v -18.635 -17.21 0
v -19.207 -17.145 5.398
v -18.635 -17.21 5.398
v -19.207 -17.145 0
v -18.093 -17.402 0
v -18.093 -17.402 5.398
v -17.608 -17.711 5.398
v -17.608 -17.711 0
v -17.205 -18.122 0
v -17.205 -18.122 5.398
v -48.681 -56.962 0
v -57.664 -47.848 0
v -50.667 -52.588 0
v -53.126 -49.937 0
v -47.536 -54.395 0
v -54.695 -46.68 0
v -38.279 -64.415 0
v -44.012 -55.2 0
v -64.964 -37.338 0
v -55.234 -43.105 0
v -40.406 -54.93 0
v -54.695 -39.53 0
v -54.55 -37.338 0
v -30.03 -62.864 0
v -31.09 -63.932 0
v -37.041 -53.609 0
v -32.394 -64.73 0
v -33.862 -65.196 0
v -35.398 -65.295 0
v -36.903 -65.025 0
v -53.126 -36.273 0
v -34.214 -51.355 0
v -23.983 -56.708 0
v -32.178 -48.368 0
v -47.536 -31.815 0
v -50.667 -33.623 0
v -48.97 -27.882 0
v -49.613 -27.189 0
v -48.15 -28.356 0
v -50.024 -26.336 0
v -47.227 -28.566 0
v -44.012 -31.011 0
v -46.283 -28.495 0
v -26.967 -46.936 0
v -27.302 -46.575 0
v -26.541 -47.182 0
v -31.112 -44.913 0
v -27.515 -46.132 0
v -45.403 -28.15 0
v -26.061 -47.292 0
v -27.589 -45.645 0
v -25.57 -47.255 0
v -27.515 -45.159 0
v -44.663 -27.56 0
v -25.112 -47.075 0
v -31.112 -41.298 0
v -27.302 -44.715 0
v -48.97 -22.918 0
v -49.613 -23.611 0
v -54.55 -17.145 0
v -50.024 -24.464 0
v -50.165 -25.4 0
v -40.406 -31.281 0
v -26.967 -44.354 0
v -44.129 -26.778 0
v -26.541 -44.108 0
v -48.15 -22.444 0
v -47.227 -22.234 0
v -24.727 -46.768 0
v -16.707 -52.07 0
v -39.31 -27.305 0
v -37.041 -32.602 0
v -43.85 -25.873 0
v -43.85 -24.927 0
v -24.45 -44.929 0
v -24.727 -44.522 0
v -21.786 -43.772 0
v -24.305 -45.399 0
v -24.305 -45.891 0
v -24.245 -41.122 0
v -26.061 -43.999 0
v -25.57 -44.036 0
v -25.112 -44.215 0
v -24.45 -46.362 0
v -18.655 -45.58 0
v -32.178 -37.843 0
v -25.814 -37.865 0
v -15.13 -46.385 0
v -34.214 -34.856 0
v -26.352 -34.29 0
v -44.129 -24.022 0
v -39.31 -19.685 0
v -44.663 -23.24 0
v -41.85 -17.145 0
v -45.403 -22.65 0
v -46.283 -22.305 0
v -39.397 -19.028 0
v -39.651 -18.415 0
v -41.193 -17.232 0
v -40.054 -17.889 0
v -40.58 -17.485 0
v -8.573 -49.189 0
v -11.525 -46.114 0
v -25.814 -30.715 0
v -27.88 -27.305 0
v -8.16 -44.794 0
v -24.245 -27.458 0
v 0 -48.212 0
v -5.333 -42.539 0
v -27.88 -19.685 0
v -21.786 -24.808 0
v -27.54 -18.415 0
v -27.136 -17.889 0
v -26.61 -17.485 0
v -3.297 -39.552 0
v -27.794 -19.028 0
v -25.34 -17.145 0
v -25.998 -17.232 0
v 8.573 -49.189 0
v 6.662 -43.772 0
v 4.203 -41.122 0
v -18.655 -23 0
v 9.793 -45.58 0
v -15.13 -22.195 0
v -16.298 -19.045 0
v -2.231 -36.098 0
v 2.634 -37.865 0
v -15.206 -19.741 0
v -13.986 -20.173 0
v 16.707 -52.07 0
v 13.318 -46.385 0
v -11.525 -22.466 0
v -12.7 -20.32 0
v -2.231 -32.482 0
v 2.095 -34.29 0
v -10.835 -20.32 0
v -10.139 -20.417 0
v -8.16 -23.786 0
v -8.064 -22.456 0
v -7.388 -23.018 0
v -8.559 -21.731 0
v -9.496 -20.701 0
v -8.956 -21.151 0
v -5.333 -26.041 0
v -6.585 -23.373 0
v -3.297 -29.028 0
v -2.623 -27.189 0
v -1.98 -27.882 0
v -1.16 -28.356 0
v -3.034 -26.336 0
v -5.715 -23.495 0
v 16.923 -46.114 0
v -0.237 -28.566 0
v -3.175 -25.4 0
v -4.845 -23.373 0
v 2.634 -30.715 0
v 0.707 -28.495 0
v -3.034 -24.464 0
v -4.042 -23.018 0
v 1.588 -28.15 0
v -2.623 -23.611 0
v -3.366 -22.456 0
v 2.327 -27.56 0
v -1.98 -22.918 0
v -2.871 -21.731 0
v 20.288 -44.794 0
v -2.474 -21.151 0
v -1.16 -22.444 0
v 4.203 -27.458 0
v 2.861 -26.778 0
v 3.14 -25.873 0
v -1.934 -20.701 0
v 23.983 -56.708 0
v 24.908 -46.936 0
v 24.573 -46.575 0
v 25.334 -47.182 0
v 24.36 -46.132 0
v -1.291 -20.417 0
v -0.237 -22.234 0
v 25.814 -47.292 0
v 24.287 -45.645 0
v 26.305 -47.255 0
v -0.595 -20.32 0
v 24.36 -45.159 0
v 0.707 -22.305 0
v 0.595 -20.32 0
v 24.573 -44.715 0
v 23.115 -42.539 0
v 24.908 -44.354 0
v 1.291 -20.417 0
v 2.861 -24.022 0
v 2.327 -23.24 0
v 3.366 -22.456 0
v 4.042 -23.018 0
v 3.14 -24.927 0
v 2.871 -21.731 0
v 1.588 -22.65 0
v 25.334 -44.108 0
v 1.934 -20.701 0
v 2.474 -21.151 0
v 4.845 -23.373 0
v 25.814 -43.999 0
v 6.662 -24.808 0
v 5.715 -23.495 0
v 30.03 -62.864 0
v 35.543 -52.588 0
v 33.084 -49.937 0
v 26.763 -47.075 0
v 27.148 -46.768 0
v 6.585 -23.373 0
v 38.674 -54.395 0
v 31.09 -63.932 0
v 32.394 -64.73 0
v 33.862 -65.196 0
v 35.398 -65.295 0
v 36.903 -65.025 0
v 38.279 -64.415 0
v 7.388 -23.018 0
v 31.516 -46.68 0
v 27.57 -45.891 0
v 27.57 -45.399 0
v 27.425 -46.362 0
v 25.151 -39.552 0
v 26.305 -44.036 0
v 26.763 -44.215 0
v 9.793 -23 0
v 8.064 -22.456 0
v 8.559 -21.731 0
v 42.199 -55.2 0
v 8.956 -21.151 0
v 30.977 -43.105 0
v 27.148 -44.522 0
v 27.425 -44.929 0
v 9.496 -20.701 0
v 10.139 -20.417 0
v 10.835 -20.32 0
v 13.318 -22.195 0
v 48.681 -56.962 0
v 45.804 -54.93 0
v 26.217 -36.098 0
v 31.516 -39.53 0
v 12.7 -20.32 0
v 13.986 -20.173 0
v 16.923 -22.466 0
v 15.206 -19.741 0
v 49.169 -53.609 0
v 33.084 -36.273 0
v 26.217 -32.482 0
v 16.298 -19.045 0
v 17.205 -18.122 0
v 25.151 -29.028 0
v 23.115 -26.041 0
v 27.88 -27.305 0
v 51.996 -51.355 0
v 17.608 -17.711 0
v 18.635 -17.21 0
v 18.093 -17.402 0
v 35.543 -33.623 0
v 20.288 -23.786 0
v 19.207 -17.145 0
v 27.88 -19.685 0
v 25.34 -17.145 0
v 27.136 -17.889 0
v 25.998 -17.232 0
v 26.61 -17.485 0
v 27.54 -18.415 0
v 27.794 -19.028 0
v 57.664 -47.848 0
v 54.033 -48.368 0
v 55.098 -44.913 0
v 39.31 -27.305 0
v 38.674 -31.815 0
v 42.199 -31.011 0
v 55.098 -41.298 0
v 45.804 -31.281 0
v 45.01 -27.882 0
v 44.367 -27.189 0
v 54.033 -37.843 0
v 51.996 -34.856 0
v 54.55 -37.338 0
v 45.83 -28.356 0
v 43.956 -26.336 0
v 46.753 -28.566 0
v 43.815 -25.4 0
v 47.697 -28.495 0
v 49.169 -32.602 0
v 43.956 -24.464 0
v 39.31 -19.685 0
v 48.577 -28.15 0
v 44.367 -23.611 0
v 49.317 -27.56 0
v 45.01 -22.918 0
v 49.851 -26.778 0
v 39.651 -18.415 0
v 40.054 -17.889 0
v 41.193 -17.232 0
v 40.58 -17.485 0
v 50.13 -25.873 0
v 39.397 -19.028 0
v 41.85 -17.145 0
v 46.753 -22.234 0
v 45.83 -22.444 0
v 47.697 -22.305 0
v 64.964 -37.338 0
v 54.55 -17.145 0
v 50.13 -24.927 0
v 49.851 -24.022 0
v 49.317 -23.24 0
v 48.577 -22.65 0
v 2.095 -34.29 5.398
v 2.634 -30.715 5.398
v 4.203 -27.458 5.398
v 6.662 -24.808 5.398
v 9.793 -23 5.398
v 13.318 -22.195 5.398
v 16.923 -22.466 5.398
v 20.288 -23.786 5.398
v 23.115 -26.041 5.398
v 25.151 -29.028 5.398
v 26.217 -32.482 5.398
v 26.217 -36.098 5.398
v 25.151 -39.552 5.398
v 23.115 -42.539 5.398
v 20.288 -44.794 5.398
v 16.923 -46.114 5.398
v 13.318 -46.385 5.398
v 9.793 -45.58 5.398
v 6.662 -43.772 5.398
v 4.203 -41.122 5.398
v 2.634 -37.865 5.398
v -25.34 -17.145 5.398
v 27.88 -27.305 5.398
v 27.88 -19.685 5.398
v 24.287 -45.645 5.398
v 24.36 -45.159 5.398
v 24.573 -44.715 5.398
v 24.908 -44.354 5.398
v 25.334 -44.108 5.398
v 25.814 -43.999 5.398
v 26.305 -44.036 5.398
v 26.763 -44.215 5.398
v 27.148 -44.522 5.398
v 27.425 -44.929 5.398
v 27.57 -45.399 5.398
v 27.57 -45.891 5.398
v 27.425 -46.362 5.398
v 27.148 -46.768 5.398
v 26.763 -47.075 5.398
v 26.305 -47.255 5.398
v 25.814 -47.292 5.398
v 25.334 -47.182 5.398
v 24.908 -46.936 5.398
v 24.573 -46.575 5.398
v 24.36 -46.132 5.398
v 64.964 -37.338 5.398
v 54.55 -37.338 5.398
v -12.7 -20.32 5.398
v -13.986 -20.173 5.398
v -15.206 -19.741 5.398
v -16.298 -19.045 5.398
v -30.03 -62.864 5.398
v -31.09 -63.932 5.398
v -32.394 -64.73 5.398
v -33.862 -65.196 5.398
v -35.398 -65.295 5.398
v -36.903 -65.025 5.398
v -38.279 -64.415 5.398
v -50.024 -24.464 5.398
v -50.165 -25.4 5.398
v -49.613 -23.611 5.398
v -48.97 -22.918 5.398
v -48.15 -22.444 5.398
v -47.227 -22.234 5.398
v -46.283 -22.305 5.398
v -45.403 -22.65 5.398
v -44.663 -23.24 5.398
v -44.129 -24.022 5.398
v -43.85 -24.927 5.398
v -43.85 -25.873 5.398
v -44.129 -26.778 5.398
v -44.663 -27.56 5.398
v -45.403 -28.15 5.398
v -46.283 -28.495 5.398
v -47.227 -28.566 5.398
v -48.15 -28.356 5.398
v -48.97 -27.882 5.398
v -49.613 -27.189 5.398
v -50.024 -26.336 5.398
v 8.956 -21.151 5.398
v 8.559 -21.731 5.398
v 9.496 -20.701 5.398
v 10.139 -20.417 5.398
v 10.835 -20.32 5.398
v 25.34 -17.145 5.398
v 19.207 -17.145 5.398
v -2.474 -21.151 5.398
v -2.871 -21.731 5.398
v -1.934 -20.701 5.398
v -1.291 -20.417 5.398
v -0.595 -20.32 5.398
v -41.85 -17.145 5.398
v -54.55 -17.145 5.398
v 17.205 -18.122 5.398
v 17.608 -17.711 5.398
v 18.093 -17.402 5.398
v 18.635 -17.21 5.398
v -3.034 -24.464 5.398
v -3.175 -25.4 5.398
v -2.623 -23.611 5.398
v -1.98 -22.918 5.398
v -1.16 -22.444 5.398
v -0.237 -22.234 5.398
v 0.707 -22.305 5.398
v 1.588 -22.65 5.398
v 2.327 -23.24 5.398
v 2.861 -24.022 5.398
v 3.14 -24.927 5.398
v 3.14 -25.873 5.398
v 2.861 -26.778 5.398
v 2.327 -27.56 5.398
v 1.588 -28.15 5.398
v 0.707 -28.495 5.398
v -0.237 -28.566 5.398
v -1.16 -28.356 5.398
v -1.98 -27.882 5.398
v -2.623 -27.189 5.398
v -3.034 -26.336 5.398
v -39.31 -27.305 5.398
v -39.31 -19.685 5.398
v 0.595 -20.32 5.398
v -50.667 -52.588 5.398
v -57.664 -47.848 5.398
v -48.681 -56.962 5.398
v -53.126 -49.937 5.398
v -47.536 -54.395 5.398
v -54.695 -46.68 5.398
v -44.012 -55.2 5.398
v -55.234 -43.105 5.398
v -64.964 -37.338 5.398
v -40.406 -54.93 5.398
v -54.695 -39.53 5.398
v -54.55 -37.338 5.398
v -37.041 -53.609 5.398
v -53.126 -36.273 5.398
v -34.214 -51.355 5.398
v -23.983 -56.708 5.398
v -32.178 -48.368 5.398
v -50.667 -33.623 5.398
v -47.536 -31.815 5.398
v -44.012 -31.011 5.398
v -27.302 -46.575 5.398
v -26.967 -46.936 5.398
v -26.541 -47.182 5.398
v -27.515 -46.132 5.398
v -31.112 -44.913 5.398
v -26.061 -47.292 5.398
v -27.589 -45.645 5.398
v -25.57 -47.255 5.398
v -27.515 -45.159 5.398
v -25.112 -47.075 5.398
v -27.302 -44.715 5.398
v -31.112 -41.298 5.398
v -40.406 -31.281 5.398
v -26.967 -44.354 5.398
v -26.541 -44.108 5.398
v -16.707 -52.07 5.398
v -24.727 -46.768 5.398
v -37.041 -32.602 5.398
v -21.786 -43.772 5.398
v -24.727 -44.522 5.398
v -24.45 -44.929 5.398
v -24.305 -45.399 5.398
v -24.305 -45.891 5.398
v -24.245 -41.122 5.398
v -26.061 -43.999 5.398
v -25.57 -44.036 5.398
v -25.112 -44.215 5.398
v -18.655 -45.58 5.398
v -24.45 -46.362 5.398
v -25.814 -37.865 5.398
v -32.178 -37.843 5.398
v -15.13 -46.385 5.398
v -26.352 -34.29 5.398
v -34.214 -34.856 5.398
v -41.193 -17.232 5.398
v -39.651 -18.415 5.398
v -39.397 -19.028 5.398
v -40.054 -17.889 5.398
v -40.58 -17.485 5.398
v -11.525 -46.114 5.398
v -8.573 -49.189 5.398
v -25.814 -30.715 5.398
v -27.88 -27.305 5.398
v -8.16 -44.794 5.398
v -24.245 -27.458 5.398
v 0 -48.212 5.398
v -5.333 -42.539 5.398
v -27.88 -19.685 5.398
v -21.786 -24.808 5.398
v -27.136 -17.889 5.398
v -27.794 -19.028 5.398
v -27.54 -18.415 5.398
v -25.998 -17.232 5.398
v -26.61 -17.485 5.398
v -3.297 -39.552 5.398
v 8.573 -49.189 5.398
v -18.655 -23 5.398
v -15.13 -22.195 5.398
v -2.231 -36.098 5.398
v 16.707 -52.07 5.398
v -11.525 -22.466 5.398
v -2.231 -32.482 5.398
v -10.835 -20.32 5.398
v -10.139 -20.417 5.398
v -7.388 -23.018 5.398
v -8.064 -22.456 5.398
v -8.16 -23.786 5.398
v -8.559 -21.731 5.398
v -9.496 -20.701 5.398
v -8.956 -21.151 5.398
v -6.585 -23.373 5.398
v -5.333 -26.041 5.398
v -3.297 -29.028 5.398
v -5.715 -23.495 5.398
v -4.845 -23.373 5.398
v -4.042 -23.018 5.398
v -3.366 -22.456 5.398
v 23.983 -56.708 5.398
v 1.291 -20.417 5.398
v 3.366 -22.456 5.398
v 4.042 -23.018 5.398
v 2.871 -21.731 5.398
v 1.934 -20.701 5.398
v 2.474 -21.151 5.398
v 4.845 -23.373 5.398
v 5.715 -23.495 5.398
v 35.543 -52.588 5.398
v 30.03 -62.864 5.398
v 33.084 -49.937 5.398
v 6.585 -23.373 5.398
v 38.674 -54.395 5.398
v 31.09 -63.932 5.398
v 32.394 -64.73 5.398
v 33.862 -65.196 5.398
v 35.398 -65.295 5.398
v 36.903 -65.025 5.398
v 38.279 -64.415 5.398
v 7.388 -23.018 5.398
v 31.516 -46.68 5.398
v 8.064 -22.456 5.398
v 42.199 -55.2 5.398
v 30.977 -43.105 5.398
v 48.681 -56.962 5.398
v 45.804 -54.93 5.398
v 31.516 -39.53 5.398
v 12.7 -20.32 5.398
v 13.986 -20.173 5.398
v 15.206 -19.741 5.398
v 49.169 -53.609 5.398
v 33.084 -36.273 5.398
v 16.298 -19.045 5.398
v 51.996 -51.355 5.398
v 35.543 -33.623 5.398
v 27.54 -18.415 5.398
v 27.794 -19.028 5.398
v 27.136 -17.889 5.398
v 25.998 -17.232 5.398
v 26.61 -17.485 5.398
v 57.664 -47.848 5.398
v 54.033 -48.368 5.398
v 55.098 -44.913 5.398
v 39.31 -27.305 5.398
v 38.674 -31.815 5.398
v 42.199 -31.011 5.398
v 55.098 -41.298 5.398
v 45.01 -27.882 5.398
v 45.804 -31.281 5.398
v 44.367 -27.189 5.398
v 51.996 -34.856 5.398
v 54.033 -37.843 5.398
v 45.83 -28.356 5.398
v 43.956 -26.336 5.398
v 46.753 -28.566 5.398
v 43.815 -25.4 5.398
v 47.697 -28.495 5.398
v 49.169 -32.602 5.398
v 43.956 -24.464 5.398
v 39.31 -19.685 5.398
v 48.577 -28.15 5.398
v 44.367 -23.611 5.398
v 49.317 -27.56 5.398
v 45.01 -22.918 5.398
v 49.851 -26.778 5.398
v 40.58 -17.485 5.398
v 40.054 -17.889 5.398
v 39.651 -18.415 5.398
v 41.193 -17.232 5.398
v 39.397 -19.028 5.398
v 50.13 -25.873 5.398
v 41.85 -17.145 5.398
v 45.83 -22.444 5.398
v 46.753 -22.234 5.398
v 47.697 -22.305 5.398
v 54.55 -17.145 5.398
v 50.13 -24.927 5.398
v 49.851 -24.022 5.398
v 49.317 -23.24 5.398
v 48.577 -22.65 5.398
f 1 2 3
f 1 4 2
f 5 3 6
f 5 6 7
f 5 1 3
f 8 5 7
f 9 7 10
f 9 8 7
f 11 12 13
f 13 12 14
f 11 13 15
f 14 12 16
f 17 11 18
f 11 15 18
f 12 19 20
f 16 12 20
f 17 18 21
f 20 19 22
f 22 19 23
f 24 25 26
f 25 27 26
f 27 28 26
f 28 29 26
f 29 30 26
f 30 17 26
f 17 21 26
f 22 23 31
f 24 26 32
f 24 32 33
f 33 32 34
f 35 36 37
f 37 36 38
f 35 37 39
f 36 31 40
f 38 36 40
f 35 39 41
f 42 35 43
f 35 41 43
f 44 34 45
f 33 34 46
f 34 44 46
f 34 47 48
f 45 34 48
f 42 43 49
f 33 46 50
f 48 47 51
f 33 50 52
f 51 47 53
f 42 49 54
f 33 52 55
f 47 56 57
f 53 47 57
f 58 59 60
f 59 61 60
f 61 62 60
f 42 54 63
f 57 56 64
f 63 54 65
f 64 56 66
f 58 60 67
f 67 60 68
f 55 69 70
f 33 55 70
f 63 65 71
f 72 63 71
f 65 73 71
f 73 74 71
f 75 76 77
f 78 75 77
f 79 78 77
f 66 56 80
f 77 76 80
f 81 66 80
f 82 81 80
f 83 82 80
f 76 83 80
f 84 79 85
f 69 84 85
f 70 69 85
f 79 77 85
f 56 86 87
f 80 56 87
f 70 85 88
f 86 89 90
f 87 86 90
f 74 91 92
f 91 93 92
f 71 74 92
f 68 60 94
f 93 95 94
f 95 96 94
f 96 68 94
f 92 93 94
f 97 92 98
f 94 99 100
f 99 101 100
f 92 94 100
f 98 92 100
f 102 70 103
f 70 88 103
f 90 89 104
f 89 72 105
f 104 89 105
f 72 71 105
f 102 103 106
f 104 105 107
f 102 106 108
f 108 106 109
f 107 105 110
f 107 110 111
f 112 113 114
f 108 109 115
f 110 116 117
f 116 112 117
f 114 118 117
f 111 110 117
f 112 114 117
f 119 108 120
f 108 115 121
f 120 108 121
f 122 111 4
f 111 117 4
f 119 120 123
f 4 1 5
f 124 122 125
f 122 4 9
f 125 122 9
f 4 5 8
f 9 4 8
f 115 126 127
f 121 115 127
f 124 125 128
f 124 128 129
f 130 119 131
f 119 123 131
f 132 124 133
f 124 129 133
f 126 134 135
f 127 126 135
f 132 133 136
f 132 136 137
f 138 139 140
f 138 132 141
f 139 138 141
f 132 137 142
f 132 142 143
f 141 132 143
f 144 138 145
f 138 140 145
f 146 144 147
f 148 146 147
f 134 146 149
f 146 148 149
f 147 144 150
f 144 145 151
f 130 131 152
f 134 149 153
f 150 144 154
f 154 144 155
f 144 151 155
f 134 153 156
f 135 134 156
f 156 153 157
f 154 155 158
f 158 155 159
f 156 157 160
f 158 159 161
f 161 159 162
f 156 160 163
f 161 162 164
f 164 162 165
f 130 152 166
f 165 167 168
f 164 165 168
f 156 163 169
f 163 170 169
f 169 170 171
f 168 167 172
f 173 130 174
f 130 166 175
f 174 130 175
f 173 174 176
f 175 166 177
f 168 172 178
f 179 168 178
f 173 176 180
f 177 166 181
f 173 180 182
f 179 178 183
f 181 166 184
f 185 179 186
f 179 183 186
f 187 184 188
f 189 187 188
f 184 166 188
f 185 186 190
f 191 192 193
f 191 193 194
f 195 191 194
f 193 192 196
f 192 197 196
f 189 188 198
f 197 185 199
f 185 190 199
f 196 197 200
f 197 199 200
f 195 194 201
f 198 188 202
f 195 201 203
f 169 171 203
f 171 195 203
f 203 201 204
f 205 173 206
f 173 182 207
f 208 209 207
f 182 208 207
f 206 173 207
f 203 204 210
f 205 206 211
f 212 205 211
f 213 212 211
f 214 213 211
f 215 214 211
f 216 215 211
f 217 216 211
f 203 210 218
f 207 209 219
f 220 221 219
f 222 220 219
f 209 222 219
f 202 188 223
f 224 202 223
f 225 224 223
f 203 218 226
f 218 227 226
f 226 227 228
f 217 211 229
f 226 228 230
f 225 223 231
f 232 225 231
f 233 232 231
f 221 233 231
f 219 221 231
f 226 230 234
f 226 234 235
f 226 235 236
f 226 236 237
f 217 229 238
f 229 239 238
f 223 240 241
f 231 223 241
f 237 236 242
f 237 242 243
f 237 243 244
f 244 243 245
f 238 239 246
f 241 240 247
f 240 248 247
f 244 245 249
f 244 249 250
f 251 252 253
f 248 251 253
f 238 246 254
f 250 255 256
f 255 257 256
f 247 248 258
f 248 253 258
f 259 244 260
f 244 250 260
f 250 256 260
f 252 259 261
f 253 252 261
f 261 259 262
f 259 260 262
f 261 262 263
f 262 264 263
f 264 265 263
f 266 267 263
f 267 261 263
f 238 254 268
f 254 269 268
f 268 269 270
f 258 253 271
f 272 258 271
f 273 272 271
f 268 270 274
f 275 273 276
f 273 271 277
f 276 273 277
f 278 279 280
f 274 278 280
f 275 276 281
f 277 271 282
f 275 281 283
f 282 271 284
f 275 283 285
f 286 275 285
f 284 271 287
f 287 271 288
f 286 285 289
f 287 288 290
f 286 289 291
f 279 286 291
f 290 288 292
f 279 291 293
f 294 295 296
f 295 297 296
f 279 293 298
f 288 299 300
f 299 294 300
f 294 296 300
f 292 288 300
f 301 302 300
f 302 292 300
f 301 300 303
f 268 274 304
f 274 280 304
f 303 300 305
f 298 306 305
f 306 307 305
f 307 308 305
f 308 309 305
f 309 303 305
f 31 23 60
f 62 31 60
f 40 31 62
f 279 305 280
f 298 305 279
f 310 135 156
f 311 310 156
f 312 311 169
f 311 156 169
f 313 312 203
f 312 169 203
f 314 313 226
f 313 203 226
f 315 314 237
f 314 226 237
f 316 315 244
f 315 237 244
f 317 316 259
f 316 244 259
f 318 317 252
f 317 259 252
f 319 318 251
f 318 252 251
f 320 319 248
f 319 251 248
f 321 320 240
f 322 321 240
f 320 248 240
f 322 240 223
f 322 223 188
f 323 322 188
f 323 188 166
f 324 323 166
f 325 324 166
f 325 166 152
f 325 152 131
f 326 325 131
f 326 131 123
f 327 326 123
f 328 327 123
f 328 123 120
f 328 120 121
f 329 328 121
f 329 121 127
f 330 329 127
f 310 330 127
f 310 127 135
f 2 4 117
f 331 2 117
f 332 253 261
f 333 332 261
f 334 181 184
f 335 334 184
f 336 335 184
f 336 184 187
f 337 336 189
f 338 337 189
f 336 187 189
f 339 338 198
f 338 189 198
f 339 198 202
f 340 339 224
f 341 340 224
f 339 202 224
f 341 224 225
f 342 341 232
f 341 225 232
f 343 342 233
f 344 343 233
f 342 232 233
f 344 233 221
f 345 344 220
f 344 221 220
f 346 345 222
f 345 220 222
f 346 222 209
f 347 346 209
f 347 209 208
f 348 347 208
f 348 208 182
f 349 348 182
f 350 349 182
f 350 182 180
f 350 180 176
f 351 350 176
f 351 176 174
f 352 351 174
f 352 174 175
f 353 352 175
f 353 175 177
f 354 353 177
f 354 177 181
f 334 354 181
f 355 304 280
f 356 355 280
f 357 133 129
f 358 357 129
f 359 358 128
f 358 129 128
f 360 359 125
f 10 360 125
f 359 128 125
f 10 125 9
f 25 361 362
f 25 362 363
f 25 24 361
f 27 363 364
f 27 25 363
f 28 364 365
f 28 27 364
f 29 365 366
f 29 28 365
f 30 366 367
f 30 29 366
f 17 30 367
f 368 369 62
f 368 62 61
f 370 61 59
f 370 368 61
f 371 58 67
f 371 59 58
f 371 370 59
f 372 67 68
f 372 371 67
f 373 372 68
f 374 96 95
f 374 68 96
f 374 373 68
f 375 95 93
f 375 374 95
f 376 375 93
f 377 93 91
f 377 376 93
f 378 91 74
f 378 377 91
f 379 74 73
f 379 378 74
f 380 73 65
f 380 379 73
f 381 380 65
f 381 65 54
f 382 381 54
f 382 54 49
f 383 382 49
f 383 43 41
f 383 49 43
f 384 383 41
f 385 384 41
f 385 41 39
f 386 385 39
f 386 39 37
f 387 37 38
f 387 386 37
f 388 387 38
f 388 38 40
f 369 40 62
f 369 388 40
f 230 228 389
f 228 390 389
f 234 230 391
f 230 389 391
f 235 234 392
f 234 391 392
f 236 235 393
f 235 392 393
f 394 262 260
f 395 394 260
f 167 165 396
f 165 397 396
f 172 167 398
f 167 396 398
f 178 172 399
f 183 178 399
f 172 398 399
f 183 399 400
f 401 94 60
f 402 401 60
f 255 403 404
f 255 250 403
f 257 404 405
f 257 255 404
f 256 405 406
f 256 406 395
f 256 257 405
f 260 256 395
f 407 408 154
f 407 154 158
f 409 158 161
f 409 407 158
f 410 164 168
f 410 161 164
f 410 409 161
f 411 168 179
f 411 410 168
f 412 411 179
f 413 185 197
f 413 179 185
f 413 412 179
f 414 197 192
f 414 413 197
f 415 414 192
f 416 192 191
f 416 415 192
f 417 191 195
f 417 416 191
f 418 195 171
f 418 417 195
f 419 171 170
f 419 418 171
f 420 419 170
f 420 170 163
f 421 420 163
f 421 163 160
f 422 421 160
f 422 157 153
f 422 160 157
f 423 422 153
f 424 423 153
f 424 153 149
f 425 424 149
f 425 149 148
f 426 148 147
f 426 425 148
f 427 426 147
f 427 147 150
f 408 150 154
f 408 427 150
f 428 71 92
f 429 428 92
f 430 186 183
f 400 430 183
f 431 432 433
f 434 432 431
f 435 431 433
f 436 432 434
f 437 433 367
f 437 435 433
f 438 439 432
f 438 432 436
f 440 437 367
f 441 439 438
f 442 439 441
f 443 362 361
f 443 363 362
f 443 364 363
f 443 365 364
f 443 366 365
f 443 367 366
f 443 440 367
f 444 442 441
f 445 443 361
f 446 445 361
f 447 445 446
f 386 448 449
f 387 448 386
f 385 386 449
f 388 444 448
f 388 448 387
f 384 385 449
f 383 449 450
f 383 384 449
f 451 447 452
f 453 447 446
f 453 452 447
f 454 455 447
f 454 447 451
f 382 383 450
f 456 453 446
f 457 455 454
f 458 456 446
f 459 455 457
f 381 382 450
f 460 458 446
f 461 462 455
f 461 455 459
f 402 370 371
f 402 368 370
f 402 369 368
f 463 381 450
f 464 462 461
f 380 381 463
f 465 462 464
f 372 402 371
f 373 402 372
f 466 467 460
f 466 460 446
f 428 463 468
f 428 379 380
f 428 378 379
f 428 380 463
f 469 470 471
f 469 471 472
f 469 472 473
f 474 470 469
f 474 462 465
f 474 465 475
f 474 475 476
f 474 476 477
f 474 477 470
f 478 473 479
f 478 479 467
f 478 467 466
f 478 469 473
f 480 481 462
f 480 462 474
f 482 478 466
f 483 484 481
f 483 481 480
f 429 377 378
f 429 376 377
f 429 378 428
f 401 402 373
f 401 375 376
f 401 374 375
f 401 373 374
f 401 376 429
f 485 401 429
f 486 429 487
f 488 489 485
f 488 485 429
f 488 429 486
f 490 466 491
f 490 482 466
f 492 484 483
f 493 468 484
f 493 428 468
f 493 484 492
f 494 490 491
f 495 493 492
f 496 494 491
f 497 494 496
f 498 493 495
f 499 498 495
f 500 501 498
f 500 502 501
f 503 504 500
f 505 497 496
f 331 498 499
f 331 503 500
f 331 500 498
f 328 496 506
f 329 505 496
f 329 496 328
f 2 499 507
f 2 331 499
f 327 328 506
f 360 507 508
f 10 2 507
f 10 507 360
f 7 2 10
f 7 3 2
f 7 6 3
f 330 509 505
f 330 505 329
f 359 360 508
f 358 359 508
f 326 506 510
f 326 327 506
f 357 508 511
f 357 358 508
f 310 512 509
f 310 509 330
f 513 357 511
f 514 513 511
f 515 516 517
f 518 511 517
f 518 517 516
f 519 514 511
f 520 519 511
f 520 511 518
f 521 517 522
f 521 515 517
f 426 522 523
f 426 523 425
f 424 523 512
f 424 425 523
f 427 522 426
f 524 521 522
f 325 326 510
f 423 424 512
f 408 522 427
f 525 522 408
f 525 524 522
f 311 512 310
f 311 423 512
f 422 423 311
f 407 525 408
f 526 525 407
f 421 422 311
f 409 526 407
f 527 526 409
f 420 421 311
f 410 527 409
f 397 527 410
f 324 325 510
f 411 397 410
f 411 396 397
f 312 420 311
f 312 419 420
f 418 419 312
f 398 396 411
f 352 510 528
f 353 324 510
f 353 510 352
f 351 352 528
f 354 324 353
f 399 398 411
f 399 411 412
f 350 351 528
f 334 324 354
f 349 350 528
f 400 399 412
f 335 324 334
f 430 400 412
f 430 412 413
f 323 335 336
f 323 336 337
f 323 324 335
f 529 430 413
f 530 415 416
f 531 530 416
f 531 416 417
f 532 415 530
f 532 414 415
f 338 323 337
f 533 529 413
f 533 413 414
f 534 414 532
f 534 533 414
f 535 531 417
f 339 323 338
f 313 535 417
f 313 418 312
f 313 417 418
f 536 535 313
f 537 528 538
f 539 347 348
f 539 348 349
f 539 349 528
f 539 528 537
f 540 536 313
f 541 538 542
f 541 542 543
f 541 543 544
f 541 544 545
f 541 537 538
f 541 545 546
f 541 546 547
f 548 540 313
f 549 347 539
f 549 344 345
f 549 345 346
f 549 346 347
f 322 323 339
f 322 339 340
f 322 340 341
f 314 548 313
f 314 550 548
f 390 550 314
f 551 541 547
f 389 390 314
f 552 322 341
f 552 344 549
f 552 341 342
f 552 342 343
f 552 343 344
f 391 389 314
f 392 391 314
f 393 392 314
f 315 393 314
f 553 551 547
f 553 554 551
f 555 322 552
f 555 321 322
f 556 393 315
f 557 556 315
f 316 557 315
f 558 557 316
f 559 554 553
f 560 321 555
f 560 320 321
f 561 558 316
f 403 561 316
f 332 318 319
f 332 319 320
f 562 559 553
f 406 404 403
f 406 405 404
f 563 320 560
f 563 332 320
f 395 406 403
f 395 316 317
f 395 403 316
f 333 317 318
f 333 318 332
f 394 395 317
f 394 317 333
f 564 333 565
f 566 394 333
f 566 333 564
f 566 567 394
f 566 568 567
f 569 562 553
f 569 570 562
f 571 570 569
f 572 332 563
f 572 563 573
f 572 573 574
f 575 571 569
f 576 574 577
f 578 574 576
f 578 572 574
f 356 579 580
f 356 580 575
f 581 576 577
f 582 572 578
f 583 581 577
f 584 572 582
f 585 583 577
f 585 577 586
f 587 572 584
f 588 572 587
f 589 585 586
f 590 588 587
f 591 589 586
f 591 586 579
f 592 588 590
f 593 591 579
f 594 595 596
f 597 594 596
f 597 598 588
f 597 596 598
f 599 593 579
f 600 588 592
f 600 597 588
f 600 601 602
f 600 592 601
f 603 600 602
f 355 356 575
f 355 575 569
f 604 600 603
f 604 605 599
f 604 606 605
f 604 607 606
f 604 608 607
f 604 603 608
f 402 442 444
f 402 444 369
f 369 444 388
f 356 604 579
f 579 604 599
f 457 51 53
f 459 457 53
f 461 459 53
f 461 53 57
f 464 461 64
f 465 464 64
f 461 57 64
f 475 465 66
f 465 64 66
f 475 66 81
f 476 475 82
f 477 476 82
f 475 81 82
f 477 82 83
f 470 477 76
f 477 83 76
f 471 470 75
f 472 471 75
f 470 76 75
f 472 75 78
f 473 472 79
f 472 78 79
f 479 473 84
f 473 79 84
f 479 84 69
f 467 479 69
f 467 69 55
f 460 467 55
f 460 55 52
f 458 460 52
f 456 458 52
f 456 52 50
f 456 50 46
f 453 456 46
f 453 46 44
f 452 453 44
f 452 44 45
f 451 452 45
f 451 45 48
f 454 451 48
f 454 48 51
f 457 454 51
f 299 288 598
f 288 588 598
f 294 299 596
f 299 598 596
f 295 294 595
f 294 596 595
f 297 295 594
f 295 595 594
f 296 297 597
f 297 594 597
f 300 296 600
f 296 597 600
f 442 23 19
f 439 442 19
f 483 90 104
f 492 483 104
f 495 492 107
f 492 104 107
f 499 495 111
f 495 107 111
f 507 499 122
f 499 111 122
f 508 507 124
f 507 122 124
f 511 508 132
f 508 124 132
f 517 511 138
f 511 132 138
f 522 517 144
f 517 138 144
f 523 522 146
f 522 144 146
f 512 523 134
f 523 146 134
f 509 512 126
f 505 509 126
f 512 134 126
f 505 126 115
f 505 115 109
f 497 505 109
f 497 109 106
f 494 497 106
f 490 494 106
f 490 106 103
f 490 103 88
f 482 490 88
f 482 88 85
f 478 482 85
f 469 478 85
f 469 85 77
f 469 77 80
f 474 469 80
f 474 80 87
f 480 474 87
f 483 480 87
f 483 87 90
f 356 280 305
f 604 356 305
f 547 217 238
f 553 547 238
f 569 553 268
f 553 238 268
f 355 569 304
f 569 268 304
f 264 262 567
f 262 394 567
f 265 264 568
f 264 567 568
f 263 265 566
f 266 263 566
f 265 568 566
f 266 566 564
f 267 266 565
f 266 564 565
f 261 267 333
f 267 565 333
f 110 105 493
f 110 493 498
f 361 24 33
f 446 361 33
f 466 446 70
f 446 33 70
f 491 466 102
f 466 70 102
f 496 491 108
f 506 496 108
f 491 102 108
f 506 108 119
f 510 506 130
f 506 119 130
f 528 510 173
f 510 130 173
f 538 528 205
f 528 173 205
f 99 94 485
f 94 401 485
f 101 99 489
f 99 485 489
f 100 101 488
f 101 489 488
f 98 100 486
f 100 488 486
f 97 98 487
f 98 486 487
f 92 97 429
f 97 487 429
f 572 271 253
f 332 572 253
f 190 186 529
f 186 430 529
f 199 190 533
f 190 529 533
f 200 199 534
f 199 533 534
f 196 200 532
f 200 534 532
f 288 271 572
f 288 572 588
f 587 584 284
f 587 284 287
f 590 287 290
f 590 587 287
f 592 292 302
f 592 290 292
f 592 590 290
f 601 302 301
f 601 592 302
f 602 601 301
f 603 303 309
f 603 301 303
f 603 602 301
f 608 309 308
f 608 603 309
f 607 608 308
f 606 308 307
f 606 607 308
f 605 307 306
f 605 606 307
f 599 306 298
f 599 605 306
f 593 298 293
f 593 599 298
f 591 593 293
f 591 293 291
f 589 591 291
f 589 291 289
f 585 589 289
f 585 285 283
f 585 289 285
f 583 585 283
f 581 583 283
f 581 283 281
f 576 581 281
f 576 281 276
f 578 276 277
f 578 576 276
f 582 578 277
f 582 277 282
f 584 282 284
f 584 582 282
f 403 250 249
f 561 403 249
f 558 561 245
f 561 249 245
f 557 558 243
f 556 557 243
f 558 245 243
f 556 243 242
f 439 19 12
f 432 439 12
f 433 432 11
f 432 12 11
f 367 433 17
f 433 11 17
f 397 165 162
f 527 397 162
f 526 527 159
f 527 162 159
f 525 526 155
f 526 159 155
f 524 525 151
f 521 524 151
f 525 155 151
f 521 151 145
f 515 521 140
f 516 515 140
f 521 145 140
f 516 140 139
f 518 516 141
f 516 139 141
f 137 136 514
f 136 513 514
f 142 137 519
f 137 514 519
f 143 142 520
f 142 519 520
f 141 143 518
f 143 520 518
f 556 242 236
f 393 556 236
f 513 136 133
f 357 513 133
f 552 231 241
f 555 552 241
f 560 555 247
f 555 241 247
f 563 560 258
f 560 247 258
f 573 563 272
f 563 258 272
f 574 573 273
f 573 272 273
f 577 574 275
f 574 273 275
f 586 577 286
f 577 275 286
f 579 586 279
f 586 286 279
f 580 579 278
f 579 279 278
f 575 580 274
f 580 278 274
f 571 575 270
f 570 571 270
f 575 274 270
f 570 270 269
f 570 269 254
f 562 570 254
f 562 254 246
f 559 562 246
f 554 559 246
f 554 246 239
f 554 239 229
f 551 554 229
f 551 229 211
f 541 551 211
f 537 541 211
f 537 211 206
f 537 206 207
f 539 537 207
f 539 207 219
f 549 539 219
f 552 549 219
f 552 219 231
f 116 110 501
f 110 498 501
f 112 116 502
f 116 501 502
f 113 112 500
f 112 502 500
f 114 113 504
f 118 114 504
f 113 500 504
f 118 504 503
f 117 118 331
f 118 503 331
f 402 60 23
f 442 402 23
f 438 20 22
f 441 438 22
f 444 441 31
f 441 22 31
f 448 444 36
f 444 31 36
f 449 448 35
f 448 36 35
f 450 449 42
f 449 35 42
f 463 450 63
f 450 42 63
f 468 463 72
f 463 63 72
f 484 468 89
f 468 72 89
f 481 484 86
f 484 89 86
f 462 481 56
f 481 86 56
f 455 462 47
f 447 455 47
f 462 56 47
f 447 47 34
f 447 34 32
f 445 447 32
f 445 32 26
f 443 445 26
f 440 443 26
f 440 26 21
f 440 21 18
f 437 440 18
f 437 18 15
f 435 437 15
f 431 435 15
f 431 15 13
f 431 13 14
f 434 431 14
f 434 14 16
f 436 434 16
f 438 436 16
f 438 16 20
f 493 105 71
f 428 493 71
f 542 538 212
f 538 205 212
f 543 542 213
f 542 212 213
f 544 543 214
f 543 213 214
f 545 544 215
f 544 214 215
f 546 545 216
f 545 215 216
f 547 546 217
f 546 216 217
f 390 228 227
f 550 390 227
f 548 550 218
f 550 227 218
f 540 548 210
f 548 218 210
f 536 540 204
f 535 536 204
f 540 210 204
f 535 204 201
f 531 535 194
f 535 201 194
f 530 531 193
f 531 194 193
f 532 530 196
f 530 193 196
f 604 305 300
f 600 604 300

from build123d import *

# Parameters (mm, degrees)
SKETCH1_R                 = 1.651
BOSS_EXTRUDE2_DEPTH       = 5.3975
SKETCH2_R                 = 1.143
CUT_EXTRUDE1_DEPTH        = 6.3975
SKETCH3_R                 = 12.1285
CUT_EXTRUDE2_DEPTH        = 6.3975
SKETCH4_W                 = 28.562713242
SKETCH4_H                 = 11.677503754
BOSS_EXTRUDE3_DEPTH       = 5.3975
SKETCH5_W                 = 216.7214489
SKETCH5_H                 = 130.569220634
CUT_EXTRUDE4_DEPTH        = 6.3975
SKETCH6_R                 = 38.1
CUT_EXTRUDE5_DEPTH        = 60.96
FILLET1_R                 = 6.35
FILLET2_R                 = 6.35
SKETCH102_W               = 11.43
SKETCH102_H               = 10.16
CUT_EXTRUDE101_DEPTH      = 6.3975001
SKETCH158_R               = 1.651
CUT_EXTRUDE157_DEPTH      = 97.79
SKETCH212_R               = 3.175
CUT_EXTRUDE211_DEPTH      = 103.378
CUT_EXTRUDE211_DEPTH_BACK = 48.768
CUT_EXTRUDE104_DEPTH      = 10
FILLET3_R                 = 2.54


with BuildPart() as part:
    # Sketch1 → Boss-Extrude2 (new body)
    with BuildSketch(Plane.XY):
        with BuildLine():
            Line((-64.964441474, 37.338), (-54.550441474, 37.338))
            Line((-54.550441474, 37.338), (-54.550441474, -37.338))
            Line((-54.550441474, -37.338), (-64.964441474, -37.338))
            ThreePointArc((-64.964441474, -37.338), (0, -74.93), (64.964441474, -37.338))
            Line((64.964441474, -37.338), (54.550441474, -37.338))
            Line((54.550441474, -37.338), (54.550441474, 37.338))
            Line((54.550441474, 37.338), (64.964441474, 37.338))
            ThreePointArc((64.964441474, 37.338), (0, 74.93), (-64.964441474, 37.338))
        make_face()
        with Locations((-46.482, 11.049)):
            Circle(SKETCH1_R, mode=Mode.SUBTRACT)
        with Locations((-21.083270032, 10.795)):
            Circle(SKETCH1_R, mode=Mode.SUBTRACT)
        with Locations((-21.083270032, -10.795)):
            Circle(SKETCH1_R, mode=Mode.SUBTRACT)
        with Locations((-46.482, -11.049)):
            Circle(SKETCH1_R, mode=Mode.SUBTRACT)
        with Locations((46.482, -11.049)):
            Circle(SKETCH1_R, mode=Mode.SUBTRACT)
        with Locations((21.083270032, -10.795)):
            Circle(SKETCH1_R, mode=Mode.SUBTRACT)
        with Locations((21.083270032, 10.795)):
            Circle(SKETCH1_R, mode=Mode.SUBTRACT)
        with Locations((46.482, 11.049)):
            Circle(SKETCH1_R, mode=Mode.SUBTRACT)
    extrude(amount=BOSS_EXTRUDE2_DEPTH)

    # Sketch2 → Cut-Extrude1 (cut, through all)
    with BuildSketch(Plane.XY.offset(5.3975)):
        with Locations((-6.731, 62.23)):
            Circle(SKETCH2_R)
        with Locations((6.731, 62.23)):
            Circle(SKETCH2_R)
    extrude(amount=-CUT_EXTRUDE1_DEPTH, mode=Mode.SUBTRACT)

    # Sketch3 → Cut-Extrude2 (cut, through all)
    with BuildSketch(Plane(origin=(0, 0, 0), x_dir=(-1, 0, 0), z_dir=(0, 0, -1))):
        with Locations((-43.105229381, -43.105229381)):
            Circle(SKETCH3_R)
        with Locations((14.224, -34.29)):
            Circle(SKETCH3_R)
        with Locations((14.224, 34.29)):
            Circle(SKETCH3_R)
        with Locations((-43.105229381, 43.105229381)):
            Circle(SKETCH3_R)
        with Locations((43.105229381, 43.105229381)):
            Circle(SKETCH3_R)
        with Locations((-14.224, 34.29)):
            Circle(SKETCH3_R)
        with Locations((-14.224, -34.29)):
            Circle(SKETCH3_R)
        with Locations((43.105229381, -43.105229381)):
            Circle(SKETCH3_R)
    extrude(amount=-CUT_EXTRUDE2_DEPTH, mode=Mode.SUBTRACT)

    # Sketch4 → Boss-Extrude3 (add)
    with BuildSketch(Plane(origin=(0, 0, 0), x_dir=(-1, 0, 0), z_dir=(0, 0, -1))):
        with Locations((-1.488809975, 62.152540216)):
            Rectangle(SKETCH4_W, SKETCH4_H)
    extrude(amount=-BOSS_EXTRUDE3_DEPTH)

    # Sketch5 → Cut-Extrude4 (cut, through all)
    with BuildSketch(Plane(origin=(0, 0, 0), x_dir=(-1, 0, 0), z_dir=(0, 0, -1))):
        with Locations((23.316688373, 48.139610317)):
            Rectangle(SKETCH5_W, SKETCH5_H)
    extrude(amount=-CUT_EXTRUDE4_DEPTH, mode=Mode.SUBTRACT)

    # Sketch6 → Cut-Extrude5 (cut)
    with BuildSketch(Plane(origin=(0, 0, 0), x_dir=(-1, 0, 0), z_dir=(0, 0, -1))):
        with Locations((0, -86.312058398)):
            Circle(SKETCH6_R)
    extrude(amount=-CUT_EXTRUDE5_DEPTH, mode=Mode.SUBTRACT)

    # Fillet1
    fillet1_edges = [part.edges().sort_by_distance(p)[0] for p in [
        (-33.000960548, -67.271401821, 2.69875),
    ]]
    fillet(fillet1_edges, radius=FILLET1_R)

    # Fillet2
    fillet2_edges = [part.edges().sort_by_distance(p)[0] for p in [
        (33.000960548, -67.271401821, 2.69875),
    ]]
    fillet(fillet2_edges, radius=FILLET2_R)

    # Sketch102 → Cut-Extrude101 (cut, through all)
    with BuildSketch(Plane(origin=(0, 0, 0), x_dir=(-1, 0, 0), z_dir=(0, 0, -1))):
        with Locations((-33.595441474, -22.225)):
            Rectangle(SKETCH102_W, SKETCH102_H)
        with Locations((33.595441474, -22.225)):
            Rectangle(SKETCH102_W, SKETCH102_H)
    extrude(amount=-CUT_EXTRUDE101_DEPTH, mode=Mode.SUBTRACT)

    # Sketch158 → Cut-Extrude157 (cut)
    with BuildSketch(Plane(origin=(30.092005081, 4.08352975, -24.638), x_dir=(-1, 0, 0), z_dir=(0, 0, -1))):
        with Locations((4.154396091, -49.728759131)):
            Circle(SKETCH158_R)
        with Locations((56.02961407, -49.728759131)):
            Circle(SKETCH158_R)
    extrude(amount=-CUT_EXTRUDE157_DEPTH, mode=Mode.SUBTRACT)

    # Sketch212 → Cut-Extrude211 (cut, two sides)
    with BuildSketch(Plane(origin=(30.092005081, 4.08352975, 11.4935), x_dir=(-1, 0, 0), z_dir=(0, 0, -1))) as cut_extrude211_sk:
        with Locations((77.082005081, -29.48352975)):
            Circle(SKETCH212_R)
        with Locations((30.092005081, -29.48352975)):
            Circle(SKETCH212_R)
        with Locations((-16.897994919, -29.48352975)):
            Circle(SKETCH212_R)
    extrude(amount=CUT_EXTRUDE211_DEPTH, mode=Mode.SUBTRACT)
    extrude(cut_extrude211_sk.sketch, amount=-CUT_EXTRUDE211_DEPTH_BACK, mode=Mode.SUBTRACT)

    # Sketch105 → Cut-Extrude104 (cut)
    with BuildSketch(Plane(origin=(0, 0, 0), x_dir=(-1, 0, 0), z_dir=(0, 0, -1))):
        with BuildLine():
            Line((-12.7, -20.32), (-8.89, -20.32))
            ThreePointArc((-8.89, -20.32), (-5.715, -23.495), (-2.54, -20.32))
            Line((-2.54, -20.32), (2.54, -20.32))
            ThreePointArc((2.54, -20.32), (5.715, -23.495), (8.89, -20.32))
            Line((8.89, -20.32), (12.7, -20.32))
            ThreePointArc((12.7, -20.32), (18.415, -14.605), (12.7, -8.89))
            Line((12.7, -8.89), (-12.7, -8.89))
            ThreePointArc((-12.7, -8.89), (-18.415, -14.605), (-12.7, -20.32))
        make_face()
    extrude(amount=-CUT_EXTRUDE104_DEPTH, mode=Mode.SUBTRACT)

    # Fillet3
    fillet3_edges = [part.edges().sort_by_distance(p)[0] for p in [
        (39.310441474, -17.145, 2.69875),
        (27.880441474, -17.145, 2.69875),
        (-27.880441474, -17.145, 2.69875),
        (-39.310441474, -17.145, 2.69875),
        (17.81953367, -17.145, 2.69875),
        (-17.81953367, -17.145, 2.69875),
        (-8.89, -20.32, 2.69875),
        (-2.54, -20.32, 2.69875),
        (2.54, -20.32, 2.69875),
        (8.89, -20.32, 2.69875),
    ]]
    fillet(fillet3_edges, radius=FILLET3_R)


solid = part.part
